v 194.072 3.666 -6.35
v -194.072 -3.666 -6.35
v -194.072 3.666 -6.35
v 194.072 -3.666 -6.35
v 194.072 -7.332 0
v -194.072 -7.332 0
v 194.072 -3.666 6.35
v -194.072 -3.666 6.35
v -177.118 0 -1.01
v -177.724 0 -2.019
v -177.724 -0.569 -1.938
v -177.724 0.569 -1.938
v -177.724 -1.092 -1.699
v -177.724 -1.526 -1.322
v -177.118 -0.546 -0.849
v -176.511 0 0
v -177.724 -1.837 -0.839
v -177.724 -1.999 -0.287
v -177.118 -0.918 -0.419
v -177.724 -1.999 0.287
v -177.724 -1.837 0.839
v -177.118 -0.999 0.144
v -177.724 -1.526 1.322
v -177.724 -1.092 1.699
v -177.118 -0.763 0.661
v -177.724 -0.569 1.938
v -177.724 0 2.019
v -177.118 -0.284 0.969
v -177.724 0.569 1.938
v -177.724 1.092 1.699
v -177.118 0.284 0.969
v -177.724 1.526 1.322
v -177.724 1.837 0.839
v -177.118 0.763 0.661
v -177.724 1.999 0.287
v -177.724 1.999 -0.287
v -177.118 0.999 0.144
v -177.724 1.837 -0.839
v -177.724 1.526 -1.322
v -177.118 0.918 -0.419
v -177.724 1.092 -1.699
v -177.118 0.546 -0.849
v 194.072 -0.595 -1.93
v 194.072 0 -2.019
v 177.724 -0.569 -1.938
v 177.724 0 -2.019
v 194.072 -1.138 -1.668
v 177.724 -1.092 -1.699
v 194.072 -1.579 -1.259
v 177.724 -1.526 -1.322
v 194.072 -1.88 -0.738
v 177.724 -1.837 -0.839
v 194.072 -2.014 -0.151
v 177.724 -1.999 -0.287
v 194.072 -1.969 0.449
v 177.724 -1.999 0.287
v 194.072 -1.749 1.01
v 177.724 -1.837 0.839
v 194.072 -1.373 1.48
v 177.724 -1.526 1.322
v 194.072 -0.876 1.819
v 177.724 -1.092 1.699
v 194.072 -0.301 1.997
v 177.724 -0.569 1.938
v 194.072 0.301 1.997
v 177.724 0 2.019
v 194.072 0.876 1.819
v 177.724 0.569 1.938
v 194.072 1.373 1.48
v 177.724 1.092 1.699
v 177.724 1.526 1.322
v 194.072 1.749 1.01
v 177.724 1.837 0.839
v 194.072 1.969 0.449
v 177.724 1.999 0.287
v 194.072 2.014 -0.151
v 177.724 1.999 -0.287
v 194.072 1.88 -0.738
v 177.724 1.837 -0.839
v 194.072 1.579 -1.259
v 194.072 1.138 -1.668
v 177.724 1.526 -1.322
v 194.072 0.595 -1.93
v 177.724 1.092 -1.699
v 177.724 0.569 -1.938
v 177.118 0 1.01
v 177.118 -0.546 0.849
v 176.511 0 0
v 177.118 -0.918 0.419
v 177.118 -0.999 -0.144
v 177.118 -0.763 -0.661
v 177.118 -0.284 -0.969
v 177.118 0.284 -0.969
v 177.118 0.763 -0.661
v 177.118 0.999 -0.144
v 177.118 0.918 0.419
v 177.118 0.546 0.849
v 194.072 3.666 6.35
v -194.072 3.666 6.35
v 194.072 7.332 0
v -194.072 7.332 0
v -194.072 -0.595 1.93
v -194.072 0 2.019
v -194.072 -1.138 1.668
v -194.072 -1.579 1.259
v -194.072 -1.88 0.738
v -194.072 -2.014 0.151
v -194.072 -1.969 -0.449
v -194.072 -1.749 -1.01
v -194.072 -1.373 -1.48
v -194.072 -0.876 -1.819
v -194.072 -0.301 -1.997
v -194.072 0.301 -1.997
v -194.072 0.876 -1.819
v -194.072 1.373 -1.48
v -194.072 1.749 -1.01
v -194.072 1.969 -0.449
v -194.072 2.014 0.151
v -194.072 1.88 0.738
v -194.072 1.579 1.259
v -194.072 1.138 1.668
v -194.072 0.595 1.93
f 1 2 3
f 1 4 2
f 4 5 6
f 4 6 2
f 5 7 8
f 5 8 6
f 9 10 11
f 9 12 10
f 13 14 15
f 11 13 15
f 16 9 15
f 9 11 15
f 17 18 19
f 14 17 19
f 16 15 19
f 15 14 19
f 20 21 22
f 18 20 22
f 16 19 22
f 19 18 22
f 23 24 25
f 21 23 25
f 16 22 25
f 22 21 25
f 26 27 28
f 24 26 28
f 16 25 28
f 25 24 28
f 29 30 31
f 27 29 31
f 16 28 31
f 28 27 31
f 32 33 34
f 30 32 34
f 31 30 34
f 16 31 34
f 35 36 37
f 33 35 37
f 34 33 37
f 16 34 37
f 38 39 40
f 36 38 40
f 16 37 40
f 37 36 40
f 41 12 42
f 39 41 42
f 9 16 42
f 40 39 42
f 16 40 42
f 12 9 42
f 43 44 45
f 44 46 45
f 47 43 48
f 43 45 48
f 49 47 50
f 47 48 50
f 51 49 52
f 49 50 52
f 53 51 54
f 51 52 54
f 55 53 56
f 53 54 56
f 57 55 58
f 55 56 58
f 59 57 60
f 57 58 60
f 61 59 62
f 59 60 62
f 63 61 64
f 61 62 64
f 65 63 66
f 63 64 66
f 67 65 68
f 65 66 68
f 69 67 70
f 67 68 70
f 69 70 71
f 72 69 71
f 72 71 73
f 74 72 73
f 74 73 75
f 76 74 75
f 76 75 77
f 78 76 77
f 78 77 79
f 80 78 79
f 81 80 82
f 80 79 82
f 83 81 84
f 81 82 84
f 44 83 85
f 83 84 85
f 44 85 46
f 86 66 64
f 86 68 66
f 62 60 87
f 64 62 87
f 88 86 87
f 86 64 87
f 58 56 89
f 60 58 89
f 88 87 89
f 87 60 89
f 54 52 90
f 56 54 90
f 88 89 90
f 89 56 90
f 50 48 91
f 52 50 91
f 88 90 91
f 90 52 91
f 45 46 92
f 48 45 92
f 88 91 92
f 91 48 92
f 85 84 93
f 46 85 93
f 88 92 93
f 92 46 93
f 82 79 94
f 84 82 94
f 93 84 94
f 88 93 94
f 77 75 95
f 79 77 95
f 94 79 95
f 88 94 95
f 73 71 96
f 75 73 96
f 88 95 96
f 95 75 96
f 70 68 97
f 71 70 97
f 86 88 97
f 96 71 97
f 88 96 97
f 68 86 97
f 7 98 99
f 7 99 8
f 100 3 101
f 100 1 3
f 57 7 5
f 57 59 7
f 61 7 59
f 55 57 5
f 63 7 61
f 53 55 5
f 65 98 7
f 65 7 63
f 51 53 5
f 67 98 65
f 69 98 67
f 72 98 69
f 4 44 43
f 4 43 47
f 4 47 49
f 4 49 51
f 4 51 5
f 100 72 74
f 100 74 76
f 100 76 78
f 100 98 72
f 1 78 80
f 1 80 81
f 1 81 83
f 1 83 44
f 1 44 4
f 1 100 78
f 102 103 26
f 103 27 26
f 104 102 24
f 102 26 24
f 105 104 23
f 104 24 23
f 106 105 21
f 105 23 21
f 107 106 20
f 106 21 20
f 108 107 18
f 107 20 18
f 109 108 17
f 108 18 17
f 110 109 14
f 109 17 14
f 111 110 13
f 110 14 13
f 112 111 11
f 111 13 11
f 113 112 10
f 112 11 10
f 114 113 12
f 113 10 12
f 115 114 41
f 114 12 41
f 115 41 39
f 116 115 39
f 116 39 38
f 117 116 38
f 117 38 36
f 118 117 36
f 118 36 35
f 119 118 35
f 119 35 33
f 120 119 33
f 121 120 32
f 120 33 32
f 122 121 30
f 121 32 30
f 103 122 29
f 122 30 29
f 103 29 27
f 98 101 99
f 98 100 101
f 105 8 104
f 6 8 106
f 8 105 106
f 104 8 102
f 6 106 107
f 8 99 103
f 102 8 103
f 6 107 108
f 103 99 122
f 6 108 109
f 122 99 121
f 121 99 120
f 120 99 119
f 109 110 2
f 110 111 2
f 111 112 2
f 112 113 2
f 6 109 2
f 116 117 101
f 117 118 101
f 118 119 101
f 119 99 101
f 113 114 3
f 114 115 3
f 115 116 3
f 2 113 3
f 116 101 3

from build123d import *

# Parameters (mm, degrees)
BOSS_EXTRUDE1_DEPTH                  = 194.071875
F_10_32_TAPPED_HOLE1_D               = 4.0386
F_10_32_TAPPED_HOLE1_DEPTH           = 16.34744
F_10_32_TAPPED_HOLE1_TIP             = 1.213317848
F_10_32_TAPPED_HOLE1_ON_FACE_2_D     = 4.0386
F_10_32_TAPPED_HOLE1_ON_FACE_2_DEPTH = 16.34744
F_10_32_TAPPED_HOLE1_ON_FACE_2_TIP   = 1.213317848


with BuildPart() as part:
    # Sketch1 → Boss-Extrude1 (new, symmetric)
    with BuildSketch(Plane(origin=(0, 0, 0), x_dir=(0, 0, -1), z_dir=(1, 0, 0))):
        Polygon((0, 7.332348419), (-6.35, 3.666174209), (-6.35, -3.666174209), (0, -7.332348419), (6.35, -3.666174209), (6.35, 3.666174209), align=None)
    extrude(amount=BOSS_EXTRUDE1_DEPTH, both=True)

    # #10-32 Tapped Hole1
    with Locations(Plane(origin=(194.071875, 0, 0), x_dir=(0, 0, 1), z_dir=(1, 0, 0))):
        with Locations((0, 0)):
            Hole(F_10_32_TAPPED_HOLE1_D / 2, depth=F_10_32_TAPPED_HOLE1_DEPTH)
            with Locations((0, 0, -(F_10_32_TAPPED_HOLE1_DEPTH + F_10_32_TAPPED_HOLE1_TIP / 2))):  # 118° drill point
                Cone(0, F_10_32_TAPPED_HOLE1_D / 2, F_10_32_TAPPED_HOLE1_TIP, mode=Mode.SUBTRACT)

    # #10-32 Tapped Hole1 on face 2
    with Locations(Plane(origin=(-194.071875, 0, 0), x_dir=(0, 0, -1), z_dir=(-1, 0, 0))):
        with Locations((0, 0)):
            Hole(F_10_32_TAPPED_HOLE1_ON_FACE_2_D / 2, depth=F_10_32_TAPPED_HOLE1_ON_FACE_2_DEPTH)
            with Locations((0, 0, -(F_10_32_TAPPED_HOLE1_ON_FACE_2_DEPTH + F_10_32_TAPPED_HOLE1_ON_FACE_2_TIP / 2))):  # 118° drill point
                Cone(0, F_10_32_TAPPED_HOLE1_ON_FACE_2_D / 2, F_10_32_TAPPED_HOLE1_ON_FACE_2_TIP, mode=Mode.SUBTRACT)


solid = part.part
